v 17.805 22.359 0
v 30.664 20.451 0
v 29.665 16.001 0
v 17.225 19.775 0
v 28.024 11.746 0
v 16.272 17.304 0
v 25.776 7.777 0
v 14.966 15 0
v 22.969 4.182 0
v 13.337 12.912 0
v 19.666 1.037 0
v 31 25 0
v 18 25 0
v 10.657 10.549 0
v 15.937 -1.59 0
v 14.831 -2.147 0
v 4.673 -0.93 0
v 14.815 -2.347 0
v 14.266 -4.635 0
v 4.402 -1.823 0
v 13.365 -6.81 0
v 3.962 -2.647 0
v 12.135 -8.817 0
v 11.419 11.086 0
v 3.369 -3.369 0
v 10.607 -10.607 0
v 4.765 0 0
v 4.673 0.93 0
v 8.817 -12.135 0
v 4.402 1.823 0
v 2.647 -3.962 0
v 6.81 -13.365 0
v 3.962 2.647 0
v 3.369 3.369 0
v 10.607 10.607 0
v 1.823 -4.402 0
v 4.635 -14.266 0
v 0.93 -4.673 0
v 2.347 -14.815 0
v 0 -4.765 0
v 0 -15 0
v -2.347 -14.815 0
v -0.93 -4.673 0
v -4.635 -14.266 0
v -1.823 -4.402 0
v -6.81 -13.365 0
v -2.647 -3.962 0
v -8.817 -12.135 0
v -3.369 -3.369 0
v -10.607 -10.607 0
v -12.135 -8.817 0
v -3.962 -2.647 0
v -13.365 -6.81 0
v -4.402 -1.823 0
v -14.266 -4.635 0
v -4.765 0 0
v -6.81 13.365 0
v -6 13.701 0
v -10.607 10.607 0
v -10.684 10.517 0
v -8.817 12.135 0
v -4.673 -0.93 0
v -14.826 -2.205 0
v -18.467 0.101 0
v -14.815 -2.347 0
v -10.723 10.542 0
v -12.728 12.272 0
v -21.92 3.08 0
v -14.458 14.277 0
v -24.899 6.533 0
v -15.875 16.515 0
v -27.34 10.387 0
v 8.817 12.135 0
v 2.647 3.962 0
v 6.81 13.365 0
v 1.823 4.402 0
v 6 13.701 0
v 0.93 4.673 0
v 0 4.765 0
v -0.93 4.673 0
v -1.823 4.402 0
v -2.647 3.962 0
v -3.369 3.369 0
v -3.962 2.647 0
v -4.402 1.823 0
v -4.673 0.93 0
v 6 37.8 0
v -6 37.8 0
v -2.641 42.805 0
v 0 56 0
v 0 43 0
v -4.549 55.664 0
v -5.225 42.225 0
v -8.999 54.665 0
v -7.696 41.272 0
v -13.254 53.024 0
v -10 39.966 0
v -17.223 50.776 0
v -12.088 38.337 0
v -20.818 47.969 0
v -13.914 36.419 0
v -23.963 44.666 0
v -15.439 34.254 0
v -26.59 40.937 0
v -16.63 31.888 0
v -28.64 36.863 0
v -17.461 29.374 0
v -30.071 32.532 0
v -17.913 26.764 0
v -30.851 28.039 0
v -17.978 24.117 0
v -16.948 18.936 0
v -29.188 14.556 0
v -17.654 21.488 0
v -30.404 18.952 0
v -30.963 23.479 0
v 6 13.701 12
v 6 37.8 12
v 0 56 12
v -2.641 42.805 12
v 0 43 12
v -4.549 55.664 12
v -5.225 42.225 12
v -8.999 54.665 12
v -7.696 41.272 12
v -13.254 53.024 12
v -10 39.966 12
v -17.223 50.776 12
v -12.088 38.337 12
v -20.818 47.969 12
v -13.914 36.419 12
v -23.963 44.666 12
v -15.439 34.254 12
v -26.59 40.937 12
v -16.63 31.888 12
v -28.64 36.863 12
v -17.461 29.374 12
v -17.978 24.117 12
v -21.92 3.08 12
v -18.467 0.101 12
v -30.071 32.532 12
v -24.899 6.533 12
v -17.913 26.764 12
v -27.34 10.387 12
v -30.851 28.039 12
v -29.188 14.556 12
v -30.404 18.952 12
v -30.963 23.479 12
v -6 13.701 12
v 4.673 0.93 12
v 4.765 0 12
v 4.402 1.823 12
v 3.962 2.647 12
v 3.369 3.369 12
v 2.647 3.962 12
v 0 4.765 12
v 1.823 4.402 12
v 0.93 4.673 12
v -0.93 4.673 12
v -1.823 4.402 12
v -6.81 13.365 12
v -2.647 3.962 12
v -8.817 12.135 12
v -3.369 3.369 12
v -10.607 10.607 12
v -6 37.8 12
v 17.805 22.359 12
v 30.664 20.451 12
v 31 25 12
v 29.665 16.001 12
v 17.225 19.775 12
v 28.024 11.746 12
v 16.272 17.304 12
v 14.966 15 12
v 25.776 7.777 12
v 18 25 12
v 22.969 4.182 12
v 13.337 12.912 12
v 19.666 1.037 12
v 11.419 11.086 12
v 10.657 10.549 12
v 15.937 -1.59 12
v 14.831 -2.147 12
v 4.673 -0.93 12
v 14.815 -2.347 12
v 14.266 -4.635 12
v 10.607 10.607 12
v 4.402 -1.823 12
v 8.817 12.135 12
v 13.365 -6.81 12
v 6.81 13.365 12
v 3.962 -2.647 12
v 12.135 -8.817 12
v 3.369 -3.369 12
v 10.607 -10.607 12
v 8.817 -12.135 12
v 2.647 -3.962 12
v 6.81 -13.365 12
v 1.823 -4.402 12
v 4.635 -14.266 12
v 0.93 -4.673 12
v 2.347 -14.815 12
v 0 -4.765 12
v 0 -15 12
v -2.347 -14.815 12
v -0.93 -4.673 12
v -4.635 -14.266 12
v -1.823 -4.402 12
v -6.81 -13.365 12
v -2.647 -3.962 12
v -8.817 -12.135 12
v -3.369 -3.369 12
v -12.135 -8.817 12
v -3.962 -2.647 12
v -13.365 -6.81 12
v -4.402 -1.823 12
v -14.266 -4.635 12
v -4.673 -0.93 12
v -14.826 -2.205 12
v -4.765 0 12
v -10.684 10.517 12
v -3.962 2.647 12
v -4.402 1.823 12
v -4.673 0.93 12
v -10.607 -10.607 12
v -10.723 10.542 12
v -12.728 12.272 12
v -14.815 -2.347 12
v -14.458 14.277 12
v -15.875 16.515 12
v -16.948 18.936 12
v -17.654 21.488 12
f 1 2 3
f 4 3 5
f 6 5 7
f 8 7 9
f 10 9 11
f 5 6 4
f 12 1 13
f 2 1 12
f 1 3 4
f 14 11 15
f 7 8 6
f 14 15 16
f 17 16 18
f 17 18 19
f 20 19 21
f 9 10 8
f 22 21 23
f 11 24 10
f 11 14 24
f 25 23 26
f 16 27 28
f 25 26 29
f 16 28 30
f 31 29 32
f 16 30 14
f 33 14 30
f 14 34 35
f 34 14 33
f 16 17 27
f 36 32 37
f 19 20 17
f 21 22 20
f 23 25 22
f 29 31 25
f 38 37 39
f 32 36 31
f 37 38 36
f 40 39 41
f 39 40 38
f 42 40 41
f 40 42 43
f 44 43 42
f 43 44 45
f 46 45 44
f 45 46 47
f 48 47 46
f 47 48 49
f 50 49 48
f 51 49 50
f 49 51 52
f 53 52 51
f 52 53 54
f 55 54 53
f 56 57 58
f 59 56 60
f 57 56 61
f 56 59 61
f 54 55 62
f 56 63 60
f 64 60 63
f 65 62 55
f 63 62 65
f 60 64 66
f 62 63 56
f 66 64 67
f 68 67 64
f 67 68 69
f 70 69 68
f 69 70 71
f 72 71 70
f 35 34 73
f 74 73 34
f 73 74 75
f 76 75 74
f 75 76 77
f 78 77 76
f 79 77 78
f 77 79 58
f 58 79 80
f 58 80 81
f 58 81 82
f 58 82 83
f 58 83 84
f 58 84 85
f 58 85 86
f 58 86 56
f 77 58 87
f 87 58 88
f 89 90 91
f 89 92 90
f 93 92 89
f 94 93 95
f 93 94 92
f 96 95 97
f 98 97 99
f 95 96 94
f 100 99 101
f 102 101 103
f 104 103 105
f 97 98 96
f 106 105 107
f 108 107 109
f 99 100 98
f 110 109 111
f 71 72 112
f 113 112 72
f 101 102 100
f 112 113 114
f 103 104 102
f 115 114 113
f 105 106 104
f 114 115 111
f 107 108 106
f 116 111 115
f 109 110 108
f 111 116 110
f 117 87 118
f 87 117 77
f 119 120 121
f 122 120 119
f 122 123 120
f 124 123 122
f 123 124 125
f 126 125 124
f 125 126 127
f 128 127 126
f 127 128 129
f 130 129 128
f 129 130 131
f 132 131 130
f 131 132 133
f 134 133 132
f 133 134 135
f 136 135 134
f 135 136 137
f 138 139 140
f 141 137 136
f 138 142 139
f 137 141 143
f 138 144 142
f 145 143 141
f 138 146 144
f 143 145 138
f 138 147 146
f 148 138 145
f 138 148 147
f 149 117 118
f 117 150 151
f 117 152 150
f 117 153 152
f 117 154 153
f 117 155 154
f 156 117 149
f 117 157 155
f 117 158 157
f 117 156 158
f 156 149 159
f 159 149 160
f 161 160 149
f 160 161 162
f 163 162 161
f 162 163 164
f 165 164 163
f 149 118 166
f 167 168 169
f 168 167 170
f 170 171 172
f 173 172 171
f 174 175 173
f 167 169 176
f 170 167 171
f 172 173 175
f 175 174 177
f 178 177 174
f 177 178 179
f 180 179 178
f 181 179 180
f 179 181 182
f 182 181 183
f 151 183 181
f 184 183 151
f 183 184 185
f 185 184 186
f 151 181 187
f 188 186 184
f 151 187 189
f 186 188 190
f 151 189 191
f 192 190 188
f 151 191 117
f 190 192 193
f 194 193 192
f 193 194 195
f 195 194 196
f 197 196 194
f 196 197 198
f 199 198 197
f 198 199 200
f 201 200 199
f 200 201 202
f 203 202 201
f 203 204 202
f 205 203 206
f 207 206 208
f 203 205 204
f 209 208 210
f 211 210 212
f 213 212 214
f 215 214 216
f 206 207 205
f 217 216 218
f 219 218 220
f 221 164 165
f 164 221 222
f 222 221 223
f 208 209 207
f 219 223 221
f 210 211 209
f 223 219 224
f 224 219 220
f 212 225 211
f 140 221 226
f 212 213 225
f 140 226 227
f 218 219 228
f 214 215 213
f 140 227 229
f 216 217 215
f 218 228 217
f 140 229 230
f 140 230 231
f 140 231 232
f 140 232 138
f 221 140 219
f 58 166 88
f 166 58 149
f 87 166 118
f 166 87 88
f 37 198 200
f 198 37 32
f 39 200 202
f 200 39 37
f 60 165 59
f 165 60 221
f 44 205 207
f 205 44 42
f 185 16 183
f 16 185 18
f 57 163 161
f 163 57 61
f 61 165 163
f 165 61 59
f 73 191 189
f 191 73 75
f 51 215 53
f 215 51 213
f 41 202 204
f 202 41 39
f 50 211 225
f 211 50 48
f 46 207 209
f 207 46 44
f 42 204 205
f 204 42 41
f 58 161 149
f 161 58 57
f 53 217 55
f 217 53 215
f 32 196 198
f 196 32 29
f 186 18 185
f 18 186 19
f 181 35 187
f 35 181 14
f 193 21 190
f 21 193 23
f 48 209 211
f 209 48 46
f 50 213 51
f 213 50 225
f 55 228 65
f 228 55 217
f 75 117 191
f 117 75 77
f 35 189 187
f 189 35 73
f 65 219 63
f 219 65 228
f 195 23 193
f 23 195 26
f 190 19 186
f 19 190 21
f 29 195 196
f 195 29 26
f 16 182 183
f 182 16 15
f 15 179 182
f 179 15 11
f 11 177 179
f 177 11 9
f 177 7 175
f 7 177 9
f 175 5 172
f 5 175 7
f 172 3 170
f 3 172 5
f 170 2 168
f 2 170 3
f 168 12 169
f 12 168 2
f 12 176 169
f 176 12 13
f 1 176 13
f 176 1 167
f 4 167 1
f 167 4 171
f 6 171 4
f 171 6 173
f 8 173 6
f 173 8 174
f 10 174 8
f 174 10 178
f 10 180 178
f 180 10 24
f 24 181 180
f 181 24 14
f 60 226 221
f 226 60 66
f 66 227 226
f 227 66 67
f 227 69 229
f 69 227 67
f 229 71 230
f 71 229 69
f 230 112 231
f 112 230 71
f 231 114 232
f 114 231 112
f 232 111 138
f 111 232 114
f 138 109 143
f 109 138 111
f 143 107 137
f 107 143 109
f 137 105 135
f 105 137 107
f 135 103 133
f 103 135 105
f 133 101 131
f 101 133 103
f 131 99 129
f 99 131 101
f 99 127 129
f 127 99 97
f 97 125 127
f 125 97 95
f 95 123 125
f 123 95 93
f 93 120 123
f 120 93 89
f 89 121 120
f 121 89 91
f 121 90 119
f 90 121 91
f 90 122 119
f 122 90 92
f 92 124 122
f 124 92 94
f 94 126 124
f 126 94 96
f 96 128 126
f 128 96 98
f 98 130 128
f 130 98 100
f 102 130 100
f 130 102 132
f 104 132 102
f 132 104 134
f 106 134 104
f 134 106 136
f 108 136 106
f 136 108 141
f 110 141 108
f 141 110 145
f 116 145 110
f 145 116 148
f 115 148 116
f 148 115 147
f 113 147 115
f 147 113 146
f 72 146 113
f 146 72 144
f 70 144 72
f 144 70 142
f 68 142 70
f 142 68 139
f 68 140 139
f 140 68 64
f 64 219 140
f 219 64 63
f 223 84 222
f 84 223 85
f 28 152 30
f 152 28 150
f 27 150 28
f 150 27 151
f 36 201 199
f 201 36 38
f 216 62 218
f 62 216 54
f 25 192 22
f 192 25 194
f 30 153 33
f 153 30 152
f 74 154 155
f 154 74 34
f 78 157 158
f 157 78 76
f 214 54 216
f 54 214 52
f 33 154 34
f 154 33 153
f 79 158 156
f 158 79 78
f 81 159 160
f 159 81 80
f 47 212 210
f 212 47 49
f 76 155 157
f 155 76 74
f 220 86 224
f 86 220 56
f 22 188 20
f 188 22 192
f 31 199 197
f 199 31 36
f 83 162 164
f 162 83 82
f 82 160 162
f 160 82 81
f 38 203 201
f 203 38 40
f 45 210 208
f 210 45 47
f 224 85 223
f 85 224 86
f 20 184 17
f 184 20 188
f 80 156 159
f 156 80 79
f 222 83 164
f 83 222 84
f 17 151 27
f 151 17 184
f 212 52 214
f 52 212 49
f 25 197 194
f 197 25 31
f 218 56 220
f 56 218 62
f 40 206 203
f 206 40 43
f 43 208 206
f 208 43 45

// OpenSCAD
$fn = 32;

// ----------------------------------------------------------------------
// Hook: 50 mm shank into a 18 mm curl, 12 mm thick
// ----------------------------------------------------------------------

// --- parameters (mm) ---
shank_len = 50;           // shank length from the boss centre
shank_w = 12;             // shank width
boss_d = 30;              // boss diameter
bore_d = 9.53;            // boss bore
curl_in = 18;             // curl inner radius
curl_out = 31;            // curl outer radius
curl_sweep = 270;         // curl sweep angle
hook_t = 12;              // hook thickness

shank_profile = [[-6, 37.8], [6, 37.8], [6, 13], [-6, 13]];
boss_profile = [[15, 0], [14.815, 2.347], [14.266, 4.635], [13.365, 6.81], [12.135, 8.817], [10.607, 10.607], [8.817, 12.135], [6.81, 13.365], [4.635, 14.266], [2.347, 14.815], [0, 15], [-2.347, 14.815], [-4.635, 14.266], [-6.81, 13.365], [-8.817, 12.135], [-10.607, 10.607], [-12.135, 8.817], [-13.365, 6.81], [-14.266, 4.635], [-14.815, 2.347], [-15, 0], [-14.815, -2.347], [-14.266, -4.635], [-13.365, -6.81], [-12.135, -8.817], [-10.607, -10.607], [-8.817, -12.135], [-6.81, -13.365], [-4.635, -14.266], [-2.347, -14.815], [0, -15], [2.347, -14.815], [4.635, -14.266], [6.81, -13.365], [8.817, -12.135], [10.607, -10.607], [12.135, -8.817], [13.365, -6.81], [14.266, -4.635], [14.815, -2.347]];
curl_profile = [[0, 56], [-4.549, 55.664], [-8.999, 54.665], [-13.254, 53.024], [-17.223, 50.776], [-20.818, 47.969], [-23.963, 44.666], [-26.59, 40.937], [-28.64, 36.863], [-30.071, 32.532], [-30.851, 28.039], [-30.963, 23.479], [-30.404, 18.952], [-29.188, 14.556], [-27.34, 10.387], [-24.899, 6.533], [-21.92, 3.08], [-18.467, 0.101], [-14.613, -2.34], [-10.444, -4.188], [-6.048, -5.404], [-1.521, -5.963], [3.039, -5.851], [7.532, -5.071], [11.863, -3.64], [15.937, -1.59], [19.666, 1.037], [22.969, 4.182], [25.776, 7.777], [28.024, 11.746], [29.665, 16.001], [30.664, 20.451], [31, 25], [18, 25], [17.805, 22.359], [17.225, 19.775], [16.272, 17.304], [14.966, 15], [13.337, 12.912], [11.419, 11.086], [9.254, 9.561], [6.888, 8.37], [4.374, 7.539], [1.764, 7.087], [-0.883, 7.022], [-3.512, 7.346], [-6.064, 8.052], [-8.485, 9.125], [-10.723, 10.542], [-12.728, 12.272], [-14.458, 14.277], [-15.875, 16.515], [-16.948, 18.936], [-17.654, 21.488], [-17.978, 24.117], [-17.913, 26.764], [-17.461, 29.374], [-16.63, 31.888], [-15.439, 34.254], [-13.914, 36.419], [-12.088, 38.337], [-10, 39.966], [-7.696, 41.272], [-5.225, 42.225], [-2.641, 42.805], [0, 43]];

difference() {
  union() {
    /* three overlapping outlines: shank, boss and the smooth curl */
    linear_extrude(height = hook_t) polygon(shank_profile);
    linear_extrude(height = hook_t) polygon(boss_profile);
    linear_extrude(height = hook_t) polygon(curl_profile);
  }
  translate([0, 0, -2.5]) cylinder(h = hook_t + 5, d = bore_d);
}
